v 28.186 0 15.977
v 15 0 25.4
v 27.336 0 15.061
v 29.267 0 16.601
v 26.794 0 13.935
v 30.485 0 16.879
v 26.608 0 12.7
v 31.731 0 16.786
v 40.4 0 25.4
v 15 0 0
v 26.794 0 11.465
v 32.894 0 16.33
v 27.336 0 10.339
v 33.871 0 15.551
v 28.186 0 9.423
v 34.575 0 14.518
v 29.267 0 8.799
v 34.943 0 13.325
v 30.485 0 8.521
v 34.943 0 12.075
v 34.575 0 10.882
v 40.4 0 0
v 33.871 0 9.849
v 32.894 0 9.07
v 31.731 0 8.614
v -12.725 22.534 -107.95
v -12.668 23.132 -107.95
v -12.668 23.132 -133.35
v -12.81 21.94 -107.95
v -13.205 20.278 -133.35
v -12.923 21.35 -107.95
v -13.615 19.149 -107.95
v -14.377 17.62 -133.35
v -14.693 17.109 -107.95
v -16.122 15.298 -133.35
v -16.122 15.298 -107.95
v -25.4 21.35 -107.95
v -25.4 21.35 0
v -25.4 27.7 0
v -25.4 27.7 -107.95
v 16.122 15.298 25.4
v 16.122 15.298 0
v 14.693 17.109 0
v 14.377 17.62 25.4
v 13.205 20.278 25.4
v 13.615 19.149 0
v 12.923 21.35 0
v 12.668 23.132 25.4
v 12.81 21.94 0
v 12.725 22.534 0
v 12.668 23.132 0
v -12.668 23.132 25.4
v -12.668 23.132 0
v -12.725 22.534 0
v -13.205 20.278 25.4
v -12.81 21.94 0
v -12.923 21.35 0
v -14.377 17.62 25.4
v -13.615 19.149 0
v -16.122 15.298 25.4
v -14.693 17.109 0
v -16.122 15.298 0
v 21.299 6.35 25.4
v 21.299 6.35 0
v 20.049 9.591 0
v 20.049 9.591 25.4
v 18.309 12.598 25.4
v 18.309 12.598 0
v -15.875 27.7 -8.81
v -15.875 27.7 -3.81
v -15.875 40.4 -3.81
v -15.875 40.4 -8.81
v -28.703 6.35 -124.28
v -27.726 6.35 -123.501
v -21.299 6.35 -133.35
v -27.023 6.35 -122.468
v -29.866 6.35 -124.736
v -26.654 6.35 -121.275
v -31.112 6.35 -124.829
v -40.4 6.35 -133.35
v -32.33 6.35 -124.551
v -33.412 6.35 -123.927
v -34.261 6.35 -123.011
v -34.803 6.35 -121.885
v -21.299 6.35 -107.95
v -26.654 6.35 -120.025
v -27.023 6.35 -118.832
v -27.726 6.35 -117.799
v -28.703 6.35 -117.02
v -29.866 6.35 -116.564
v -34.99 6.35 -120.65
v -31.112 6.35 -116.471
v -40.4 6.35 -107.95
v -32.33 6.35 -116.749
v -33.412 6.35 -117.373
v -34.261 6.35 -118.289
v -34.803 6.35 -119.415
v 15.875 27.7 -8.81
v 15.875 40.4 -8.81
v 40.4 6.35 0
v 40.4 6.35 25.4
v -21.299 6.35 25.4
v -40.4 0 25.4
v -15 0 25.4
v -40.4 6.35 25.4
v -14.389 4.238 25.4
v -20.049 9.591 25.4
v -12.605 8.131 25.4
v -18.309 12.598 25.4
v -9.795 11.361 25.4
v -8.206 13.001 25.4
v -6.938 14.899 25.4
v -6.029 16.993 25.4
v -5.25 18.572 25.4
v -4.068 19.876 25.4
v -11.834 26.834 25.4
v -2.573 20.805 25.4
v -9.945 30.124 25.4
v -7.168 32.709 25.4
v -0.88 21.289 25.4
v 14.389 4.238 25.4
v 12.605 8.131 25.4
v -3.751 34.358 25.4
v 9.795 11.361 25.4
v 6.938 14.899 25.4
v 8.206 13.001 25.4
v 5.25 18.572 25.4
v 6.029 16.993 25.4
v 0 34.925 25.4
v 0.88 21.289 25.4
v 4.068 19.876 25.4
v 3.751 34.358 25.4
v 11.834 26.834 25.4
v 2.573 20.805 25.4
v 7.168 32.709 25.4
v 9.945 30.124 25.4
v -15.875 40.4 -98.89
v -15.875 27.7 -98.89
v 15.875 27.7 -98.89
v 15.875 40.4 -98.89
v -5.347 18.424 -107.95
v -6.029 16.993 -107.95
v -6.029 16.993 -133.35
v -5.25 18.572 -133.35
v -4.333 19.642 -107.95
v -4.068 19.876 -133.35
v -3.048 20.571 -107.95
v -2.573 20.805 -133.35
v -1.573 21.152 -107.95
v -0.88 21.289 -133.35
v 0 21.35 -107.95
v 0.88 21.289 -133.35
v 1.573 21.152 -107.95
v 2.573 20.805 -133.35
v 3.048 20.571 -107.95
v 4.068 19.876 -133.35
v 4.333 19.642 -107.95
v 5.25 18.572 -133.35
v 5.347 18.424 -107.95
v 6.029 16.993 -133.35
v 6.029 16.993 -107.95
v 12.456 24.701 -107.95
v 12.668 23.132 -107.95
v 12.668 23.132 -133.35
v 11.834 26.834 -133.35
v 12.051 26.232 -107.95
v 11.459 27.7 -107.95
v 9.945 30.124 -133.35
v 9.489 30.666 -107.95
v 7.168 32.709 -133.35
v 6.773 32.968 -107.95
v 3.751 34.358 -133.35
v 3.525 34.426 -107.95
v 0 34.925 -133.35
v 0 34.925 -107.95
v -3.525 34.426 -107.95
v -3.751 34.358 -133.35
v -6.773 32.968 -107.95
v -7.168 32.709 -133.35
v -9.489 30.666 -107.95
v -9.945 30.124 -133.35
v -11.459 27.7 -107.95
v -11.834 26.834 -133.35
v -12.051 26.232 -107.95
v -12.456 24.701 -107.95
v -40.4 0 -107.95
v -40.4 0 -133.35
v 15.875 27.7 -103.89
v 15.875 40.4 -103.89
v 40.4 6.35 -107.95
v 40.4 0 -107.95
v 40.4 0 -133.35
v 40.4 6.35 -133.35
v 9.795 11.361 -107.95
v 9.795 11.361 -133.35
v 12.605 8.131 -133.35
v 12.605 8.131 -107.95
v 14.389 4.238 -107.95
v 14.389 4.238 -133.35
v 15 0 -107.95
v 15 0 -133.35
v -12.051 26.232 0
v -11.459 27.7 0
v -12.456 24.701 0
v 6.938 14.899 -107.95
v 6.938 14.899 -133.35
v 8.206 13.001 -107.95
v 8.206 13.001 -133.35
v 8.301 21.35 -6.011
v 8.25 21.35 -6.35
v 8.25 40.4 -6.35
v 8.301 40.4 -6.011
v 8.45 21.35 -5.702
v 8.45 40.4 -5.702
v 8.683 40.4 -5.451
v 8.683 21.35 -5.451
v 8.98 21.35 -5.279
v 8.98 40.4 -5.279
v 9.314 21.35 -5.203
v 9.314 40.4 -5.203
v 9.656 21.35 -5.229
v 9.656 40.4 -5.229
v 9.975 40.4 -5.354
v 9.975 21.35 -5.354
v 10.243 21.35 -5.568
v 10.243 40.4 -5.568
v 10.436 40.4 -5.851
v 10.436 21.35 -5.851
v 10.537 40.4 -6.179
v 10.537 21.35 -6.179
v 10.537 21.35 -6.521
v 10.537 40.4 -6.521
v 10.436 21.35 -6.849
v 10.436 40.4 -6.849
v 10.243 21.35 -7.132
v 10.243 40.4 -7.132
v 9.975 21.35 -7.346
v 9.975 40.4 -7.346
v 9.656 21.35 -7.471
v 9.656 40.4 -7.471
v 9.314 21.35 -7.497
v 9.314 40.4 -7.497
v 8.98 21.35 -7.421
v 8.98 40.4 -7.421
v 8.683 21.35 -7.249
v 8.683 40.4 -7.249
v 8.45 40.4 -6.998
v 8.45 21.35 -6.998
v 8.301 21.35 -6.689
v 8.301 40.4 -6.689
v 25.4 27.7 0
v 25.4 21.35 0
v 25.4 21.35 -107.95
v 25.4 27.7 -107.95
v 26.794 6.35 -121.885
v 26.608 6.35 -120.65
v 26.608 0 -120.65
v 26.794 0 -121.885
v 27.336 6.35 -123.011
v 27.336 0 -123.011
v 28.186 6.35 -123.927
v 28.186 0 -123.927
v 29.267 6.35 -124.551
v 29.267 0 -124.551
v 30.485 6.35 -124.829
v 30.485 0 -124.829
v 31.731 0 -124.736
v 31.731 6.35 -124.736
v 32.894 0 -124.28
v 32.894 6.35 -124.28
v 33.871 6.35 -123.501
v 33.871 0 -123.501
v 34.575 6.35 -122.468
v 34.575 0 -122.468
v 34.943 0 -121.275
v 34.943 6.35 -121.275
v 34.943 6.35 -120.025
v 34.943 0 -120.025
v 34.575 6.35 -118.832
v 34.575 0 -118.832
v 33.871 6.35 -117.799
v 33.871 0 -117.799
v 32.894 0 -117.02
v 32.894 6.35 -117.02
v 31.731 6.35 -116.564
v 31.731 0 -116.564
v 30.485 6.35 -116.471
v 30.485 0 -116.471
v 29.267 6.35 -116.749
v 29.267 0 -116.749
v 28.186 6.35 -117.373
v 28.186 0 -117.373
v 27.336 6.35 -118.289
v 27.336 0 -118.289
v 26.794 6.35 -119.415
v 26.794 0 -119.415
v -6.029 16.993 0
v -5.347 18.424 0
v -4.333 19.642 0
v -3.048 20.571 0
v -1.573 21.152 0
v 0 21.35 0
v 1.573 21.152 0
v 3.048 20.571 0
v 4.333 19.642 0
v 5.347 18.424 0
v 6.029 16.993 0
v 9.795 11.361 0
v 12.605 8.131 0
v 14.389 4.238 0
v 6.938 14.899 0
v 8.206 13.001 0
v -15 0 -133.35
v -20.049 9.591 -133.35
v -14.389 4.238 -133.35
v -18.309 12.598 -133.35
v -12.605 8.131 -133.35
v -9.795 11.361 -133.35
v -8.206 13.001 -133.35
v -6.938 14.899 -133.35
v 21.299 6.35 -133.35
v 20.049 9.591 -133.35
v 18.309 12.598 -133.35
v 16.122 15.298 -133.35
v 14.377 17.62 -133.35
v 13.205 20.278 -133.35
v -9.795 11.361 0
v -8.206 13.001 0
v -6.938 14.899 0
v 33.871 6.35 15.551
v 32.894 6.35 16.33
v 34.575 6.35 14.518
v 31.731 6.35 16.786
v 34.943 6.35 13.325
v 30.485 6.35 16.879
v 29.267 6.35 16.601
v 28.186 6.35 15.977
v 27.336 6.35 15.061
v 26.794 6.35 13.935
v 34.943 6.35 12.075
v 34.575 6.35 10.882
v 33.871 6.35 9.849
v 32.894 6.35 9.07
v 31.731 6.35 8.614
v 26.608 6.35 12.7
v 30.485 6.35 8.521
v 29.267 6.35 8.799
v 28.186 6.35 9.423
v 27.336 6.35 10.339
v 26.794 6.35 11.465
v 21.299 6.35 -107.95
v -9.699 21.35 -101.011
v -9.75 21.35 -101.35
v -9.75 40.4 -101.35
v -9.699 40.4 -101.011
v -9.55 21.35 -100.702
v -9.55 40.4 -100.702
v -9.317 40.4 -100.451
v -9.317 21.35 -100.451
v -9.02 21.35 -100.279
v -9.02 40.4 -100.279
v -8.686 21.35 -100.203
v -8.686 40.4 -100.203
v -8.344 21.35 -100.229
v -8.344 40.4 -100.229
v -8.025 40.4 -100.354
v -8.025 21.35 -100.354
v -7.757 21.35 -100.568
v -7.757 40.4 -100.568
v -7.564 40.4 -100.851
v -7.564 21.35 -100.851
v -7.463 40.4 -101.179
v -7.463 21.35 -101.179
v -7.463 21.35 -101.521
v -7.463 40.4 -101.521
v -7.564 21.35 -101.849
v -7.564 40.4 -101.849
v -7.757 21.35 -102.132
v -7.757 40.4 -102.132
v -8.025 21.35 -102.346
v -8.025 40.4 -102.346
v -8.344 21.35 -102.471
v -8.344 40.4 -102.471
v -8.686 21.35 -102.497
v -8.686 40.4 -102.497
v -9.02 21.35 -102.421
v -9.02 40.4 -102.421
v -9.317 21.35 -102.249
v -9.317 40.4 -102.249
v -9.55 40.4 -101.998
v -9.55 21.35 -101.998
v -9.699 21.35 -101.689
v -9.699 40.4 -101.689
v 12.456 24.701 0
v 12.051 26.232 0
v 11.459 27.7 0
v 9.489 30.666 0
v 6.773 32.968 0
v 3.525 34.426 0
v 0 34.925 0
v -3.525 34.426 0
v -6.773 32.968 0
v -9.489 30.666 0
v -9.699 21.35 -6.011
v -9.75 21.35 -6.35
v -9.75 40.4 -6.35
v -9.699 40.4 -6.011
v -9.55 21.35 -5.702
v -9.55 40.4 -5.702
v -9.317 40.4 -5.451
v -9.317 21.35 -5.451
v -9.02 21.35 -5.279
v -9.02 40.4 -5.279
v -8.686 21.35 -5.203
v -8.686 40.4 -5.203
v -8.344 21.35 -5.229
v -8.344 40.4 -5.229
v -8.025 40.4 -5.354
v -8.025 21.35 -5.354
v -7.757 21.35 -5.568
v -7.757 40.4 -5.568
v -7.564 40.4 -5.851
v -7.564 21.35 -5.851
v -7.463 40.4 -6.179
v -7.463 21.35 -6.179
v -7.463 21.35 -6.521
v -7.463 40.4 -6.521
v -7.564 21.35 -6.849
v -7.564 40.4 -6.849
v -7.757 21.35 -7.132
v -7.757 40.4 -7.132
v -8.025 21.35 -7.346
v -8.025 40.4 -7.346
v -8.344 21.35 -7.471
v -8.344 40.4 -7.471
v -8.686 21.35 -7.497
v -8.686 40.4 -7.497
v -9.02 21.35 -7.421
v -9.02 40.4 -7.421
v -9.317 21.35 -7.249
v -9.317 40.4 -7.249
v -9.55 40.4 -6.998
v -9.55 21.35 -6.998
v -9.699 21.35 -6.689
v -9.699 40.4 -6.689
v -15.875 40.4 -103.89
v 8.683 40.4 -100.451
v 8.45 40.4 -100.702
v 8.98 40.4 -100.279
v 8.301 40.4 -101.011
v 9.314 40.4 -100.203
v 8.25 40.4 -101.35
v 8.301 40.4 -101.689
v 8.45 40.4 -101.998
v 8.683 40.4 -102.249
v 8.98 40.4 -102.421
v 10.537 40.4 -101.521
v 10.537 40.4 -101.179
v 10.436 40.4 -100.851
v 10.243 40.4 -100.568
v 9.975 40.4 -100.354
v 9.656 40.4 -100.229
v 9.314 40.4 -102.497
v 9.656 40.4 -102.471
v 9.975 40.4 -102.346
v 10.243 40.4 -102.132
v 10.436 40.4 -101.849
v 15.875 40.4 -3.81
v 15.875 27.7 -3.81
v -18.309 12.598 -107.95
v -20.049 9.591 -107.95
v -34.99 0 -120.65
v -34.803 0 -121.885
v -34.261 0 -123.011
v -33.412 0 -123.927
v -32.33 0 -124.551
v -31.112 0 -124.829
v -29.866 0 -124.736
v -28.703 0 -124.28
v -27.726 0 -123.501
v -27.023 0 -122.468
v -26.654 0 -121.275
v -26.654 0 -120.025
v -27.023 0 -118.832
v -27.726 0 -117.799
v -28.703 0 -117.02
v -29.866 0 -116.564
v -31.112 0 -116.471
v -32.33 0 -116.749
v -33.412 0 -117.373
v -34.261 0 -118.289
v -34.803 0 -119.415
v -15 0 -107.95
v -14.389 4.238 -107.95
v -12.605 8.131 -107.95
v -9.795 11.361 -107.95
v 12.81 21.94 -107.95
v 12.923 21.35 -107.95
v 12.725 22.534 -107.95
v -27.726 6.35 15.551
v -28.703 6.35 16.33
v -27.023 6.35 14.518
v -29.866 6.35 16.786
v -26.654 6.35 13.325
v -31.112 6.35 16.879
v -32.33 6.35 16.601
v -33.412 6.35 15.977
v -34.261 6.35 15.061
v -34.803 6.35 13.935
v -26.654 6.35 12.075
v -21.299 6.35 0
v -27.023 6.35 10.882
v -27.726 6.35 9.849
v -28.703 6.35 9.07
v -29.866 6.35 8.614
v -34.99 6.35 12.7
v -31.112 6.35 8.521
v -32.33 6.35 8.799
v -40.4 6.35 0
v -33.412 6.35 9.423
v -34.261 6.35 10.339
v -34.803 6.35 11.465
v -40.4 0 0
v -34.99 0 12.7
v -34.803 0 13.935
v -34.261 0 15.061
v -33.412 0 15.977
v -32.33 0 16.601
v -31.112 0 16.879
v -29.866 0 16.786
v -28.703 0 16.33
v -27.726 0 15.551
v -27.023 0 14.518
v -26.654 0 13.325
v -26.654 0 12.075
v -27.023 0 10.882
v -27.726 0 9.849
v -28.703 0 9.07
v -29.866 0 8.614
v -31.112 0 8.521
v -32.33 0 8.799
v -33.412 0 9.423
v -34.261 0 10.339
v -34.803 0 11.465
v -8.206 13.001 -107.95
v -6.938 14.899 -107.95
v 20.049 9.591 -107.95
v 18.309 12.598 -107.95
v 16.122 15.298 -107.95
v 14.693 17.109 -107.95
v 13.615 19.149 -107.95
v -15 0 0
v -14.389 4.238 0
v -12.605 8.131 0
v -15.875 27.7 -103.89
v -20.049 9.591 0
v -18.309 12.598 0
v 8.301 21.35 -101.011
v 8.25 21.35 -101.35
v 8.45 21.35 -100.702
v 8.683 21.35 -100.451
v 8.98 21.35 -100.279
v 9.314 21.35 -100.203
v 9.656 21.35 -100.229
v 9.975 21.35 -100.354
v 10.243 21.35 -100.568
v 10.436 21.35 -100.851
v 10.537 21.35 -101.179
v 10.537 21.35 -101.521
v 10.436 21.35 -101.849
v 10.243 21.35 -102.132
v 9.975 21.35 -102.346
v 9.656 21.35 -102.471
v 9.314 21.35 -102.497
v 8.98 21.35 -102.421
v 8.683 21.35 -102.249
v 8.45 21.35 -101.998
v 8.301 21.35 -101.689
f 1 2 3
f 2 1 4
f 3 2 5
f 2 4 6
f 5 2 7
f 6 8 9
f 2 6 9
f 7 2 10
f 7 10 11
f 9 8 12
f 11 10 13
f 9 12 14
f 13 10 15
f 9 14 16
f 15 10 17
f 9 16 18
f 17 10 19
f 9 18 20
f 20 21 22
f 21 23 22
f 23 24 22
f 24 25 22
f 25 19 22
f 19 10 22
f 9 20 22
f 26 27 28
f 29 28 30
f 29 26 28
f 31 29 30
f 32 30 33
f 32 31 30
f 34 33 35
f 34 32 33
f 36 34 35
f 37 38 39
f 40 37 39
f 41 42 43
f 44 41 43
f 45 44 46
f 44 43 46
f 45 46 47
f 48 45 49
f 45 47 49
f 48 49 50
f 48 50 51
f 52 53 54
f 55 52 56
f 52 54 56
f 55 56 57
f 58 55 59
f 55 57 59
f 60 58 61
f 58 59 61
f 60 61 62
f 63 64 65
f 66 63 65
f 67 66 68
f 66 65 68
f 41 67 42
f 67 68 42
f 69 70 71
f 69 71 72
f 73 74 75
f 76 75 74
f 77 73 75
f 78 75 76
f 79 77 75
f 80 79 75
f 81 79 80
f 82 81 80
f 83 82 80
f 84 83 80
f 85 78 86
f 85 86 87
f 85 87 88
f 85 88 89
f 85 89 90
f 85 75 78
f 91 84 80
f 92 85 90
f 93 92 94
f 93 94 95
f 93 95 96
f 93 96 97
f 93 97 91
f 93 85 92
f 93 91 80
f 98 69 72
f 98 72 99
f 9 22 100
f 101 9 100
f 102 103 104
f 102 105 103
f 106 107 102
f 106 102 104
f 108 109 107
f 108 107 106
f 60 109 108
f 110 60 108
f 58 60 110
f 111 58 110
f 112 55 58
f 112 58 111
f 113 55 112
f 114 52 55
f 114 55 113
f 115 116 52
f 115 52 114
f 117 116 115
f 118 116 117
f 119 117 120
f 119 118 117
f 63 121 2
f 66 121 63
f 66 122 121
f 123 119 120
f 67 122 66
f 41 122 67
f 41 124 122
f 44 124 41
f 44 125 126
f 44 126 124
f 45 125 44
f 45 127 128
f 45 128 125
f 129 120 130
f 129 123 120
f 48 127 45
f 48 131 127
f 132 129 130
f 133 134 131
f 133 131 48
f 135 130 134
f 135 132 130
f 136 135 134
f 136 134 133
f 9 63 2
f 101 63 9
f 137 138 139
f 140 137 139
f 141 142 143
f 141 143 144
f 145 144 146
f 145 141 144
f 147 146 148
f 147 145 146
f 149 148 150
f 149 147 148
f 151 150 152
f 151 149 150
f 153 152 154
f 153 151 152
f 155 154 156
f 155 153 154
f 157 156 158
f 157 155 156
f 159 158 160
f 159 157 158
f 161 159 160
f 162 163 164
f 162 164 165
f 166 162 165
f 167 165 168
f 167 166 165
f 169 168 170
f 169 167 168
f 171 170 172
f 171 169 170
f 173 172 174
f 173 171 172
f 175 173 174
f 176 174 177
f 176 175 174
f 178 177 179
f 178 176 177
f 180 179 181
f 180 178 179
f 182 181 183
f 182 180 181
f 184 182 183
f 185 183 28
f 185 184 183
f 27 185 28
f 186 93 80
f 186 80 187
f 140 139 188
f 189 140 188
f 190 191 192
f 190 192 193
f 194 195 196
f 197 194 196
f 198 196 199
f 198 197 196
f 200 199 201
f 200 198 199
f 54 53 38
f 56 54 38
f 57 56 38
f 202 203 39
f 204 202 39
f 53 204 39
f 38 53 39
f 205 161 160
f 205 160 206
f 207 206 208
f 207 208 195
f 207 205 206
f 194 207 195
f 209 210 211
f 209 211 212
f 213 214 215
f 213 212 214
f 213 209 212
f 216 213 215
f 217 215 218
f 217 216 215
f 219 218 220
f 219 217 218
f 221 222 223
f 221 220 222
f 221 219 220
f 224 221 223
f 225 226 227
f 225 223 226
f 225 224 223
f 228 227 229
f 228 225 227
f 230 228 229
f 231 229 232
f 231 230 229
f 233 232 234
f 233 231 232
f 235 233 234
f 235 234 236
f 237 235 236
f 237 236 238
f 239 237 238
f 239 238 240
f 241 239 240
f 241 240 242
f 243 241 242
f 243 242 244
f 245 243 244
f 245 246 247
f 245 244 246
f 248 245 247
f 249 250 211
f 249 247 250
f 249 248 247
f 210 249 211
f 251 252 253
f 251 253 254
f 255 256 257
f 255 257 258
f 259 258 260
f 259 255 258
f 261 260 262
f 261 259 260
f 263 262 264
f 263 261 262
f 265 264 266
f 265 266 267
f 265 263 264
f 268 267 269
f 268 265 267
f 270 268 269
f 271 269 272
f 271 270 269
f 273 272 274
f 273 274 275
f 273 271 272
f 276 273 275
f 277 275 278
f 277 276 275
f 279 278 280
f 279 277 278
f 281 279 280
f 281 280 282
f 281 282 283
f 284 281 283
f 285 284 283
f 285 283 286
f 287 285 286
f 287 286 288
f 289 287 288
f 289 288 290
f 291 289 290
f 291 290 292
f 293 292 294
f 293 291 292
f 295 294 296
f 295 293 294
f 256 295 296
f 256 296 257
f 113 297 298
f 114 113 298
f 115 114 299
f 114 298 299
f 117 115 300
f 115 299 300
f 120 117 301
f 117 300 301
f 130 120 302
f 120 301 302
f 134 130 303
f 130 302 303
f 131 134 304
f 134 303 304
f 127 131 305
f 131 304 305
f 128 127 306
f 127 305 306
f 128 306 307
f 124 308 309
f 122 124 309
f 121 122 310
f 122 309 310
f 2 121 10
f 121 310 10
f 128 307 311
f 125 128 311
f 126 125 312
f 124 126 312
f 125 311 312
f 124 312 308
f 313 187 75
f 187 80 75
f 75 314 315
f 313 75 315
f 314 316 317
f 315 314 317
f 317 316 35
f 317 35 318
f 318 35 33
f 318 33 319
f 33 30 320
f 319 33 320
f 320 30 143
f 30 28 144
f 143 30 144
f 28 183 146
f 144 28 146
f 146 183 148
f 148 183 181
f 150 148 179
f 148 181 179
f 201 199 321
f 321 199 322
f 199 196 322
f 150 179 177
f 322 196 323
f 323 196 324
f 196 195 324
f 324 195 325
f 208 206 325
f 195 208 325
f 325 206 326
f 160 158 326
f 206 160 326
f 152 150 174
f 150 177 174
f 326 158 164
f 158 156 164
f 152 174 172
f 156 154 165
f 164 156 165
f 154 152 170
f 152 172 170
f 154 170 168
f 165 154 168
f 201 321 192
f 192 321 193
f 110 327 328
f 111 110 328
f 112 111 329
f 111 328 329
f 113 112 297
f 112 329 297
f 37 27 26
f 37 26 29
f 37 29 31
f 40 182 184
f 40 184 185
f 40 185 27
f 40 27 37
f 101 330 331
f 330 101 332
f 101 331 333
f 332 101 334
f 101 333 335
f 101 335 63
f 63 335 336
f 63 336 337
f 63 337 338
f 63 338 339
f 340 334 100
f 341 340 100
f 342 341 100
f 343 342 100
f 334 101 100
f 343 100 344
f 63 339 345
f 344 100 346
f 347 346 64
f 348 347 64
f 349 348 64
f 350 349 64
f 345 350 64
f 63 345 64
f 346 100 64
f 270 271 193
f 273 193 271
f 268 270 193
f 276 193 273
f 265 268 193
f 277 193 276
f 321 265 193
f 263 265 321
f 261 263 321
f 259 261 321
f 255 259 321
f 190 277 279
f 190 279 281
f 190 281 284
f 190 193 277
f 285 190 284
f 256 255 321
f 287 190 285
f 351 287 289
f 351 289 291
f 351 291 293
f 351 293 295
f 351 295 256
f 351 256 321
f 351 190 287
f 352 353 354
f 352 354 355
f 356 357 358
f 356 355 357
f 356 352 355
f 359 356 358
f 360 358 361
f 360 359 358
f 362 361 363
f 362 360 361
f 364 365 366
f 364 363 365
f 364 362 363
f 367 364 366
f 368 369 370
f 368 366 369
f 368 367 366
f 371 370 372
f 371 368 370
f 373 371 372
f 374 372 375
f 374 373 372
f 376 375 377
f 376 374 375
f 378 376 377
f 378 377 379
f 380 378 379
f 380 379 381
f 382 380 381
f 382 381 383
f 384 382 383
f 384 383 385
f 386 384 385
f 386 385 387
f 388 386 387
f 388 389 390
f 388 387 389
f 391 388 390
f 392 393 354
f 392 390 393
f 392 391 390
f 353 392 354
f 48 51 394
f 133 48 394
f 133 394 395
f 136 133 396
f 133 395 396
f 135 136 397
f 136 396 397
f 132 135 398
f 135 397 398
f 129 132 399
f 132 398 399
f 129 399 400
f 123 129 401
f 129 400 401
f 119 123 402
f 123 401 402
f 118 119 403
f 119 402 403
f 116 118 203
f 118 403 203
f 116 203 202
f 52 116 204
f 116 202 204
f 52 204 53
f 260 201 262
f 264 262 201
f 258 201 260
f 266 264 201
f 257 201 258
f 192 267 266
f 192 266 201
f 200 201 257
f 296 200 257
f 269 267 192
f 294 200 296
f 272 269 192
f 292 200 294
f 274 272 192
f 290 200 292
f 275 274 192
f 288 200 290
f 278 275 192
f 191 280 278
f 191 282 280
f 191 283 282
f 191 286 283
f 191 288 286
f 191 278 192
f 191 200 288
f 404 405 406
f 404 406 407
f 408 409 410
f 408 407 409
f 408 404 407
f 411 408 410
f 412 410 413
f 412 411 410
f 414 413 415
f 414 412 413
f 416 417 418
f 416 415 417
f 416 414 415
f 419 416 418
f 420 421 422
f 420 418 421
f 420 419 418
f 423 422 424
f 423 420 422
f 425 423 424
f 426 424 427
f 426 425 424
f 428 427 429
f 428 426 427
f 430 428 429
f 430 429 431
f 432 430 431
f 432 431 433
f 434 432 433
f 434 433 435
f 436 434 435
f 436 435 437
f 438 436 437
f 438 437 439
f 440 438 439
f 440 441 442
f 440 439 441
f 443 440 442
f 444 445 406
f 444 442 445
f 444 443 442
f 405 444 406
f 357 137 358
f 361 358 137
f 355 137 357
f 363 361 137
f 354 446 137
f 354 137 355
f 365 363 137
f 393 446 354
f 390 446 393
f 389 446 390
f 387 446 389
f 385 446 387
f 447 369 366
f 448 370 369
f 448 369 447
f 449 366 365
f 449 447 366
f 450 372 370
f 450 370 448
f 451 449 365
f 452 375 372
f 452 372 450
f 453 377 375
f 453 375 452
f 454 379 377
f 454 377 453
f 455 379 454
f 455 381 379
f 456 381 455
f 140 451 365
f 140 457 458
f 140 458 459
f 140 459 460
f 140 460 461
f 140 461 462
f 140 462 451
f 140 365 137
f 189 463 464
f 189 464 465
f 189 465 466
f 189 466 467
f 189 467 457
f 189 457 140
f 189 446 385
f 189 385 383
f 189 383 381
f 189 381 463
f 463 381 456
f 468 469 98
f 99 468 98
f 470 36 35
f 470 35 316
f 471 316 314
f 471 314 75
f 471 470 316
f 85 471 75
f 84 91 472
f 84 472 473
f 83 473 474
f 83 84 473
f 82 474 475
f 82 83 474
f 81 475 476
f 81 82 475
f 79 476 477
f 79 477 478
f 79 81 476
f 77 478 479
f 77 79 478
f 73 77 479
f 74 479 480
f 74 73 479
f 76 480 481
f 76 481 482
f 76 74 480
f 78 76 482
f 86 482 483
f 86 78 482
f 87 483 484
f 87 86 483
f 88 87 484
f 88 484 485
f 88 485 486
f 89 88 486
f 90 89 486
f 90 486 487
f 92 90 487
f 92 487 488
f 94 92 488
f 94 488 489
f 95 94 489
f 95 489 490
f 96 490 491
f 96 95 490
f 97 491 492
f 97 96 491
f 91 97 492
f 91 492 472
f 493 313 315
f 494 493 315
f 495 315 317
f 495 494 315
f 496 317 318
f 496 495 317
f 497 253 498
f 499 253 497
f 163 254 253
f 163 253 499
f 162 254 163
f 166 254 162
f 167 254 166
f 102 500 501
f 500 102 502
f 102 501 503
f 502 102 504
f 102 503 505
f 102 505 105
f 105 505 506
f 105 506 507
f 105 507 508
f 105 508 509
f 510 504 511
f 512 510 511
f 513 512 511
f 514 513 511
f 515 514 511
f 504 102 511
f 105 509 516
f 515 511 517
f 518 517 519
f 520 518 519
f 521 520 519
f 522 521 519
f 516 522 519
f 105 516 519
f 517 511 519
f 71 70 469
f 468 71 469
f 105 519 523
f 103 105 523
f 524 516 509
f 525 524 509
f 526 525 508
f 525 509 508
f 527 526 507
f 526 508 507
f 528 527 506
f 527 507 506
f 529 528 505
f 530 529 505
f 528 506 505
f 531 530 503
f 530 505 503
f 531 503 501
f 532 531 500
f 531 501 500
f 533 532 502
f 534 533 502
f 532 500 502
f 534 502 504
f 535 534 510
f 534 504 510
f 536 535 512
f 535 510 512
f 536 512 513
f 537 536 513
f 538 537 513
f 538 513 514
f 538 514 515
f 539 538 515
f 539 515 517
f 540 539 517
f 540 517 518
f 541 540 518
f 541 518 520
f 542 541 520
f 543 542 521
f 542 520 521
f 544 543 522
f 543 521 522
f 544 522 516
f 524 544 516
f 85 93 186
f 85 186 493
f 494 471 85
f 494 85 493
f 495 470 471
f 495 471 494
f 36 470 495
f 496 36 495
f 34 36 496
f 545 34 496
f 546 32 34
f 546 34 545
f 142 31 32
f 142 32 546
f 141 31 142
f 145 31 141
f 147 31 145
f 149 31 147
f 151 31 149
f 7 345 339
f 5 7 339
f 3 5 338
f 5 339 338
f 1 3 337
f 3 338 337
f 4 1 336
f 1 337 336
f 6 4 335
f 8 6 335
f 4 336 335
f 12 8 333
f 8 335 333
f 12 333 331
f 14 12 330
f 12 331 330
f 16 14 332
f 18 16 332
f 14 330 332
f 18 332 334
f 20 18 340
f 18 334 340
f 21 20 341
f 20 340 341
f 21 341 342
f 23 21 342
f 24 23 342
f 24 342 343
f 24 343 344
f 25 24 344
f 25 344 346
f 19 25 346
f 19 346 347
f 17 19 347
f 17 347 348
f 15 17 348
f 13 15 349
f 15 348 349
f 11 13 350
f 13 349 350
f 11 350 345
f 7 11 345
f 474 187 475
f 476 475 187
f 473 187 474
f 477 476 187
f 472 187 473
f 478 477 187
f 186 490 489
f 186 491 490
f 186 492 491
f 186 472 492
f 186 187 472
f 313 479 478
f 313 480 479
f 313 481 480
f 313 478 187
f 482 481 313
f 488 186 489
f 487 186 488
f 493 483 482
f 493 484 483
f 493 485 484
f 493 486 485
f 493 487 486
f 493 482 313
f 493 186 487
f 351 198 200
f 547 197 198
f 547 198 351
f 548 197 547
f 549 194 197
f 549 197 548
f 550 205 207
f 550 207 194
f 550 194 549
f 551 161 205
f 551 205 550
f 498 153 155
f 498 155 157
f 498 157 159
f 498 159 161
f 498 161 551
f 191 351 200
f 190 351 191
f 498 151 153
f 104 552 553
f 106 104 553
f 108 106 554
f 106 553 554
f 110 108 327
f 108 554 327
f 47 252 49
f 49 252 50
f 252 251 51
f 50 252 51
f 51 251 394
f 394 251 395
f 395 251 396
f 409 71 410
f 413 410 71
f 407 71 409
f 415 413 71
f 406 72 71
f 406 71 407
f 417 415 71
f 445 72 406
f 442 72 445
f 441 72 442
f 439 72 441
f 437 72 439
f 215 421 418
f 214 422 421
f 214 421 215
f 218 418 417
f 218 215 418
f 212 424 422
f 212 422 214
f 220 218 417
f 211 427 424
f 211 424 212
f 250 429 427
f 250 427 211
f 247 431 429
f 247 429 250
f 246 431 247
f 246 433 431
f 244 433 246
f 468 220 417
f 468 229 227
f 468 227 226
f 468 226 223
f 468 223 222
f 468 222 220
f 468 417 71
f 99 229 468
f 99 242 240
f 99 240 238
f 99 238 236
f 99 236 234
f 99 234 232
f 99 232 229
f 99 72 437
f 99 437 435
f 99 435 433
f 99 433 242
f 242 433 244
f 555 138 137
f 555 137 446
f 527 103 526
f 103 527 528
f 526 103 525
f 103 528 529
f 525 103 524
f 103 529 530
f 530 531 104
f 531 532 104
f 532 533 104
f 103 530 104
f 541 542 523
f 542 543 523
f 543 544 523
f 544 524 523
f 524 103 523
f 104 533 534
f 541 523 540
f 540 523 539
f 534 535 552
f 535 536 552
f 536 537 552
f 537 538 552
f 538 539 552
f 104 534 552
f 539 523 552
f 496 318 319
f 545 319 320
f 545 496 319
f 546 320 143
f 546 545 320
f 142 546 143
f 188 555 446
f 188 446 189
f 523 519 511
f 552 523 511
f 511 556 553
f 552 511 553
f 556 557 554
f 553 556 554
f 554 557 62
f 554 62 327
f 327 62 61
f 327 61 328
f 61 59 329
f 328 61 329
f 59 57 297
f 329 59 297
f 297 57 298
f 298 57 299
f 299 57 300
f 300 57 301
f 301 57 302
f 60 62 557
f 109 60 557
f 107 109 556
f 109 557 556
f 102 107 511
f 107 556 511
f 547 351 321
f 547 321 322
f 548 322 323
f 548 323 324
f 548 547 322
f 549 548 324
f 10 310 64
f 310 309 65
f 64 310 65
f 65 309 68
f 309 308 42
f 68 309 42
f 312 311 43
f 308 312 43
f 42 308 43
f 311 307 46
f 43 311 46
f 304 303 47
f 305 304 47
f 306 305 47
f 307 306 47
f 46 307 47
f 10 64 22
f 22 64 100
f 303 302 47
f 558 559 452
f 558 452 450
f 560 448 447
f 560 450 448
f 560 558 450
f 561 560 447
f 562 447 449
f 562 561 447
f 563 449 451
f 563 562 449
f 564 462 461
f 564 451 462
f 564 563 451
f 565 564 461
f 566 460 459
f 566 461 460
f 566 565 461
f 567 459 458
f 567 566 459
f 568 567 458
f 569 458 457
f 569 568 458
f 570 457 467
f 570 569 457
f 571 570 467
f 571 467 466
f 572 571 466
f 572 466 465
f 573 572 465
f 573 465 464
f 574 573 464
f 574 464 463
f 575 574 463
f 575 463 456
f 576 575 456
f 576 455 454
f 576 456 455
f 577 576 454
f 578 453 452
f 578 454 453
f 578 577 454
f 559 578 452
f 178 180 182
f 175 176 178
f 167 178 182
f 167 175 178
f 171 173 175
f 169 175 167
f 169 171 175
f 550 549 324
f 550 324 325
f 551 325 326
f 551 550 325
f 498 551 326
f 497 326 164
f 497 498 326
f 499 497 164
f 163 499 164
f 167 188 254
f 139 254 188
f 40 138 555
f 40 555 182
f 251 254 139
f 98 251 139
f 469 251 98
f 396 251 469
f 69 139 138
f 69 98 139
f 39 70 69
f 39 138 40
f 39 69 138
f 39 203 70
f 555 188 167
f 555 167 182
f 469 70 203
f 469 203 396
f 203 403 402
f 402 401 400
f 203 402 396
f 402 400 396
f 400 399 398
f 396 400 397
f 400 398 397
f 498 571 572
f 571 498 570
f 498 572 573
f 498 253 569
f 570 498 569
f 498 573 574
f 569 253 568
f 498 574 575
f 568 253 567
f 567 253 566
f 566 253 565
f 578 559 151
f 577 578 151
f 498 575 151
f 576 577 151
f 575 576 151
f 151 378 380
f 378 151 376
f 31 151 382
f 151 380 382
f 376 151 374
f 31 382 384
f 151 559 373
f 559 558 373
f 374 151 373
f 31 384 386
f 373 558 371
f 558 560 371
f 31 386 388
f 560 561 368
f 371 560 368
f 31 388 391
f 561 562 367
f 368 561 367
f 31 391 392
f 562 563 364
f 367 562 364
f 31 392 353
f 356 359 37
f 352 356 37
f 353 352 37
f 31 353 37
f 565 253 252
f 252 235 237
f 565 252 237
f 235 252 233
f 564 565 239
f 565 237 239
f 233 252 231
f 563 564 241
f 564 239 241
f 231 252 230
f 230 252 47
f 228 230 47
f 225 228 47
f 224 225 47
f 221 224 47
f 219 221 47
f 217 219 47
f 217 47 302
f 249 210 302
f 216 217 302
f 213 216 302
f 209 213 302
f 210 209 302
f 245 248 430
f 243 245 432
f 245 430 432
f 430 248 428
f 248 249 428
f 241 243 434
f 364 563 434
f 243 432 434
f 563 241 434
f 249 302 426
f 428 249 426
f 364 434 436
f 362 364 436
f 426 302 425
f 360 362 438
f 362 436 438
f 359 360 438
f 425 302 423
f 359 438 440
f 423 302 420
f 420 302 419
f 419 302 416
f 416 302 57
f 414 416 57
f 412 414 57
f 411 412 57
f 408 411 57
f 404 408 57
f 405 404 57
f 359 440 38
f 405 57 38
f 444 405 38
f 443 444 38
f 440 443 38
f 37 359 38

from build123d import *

# Parameters (mm, degrees)
BOSS_EXTRUDE1_DEPTH     = 25.4
SKETCH2_R               = 4.191
CUT_EXTRUDE1_DEPTH      = 6.35
SKETCH3_W               = 50.8
SKETCH3_H               = 6.35
BOSS_EXTRUDE2_DEPTH     = 107.95
SKETCH5_W               = 31.75
SKETCH5_H               = 5
BOSS_EXTRUDE3_DEPTH     = 12.7
CUT_EXTRUDE2_DEPTH      = 143.062213484
CUT_EXTRUDE2_DEPTH_BACK = 143.062213484
SKETCH4_R               = 1.15


with BuildPart() as part:
    # Sketch1 → Boss-Extrude1 (new body)
    with BuildSketch(Plane.XY):
        with BuildLine():
            Line((-40.4, 0), (-15, 0))
            ThreePointArc((-15, 0), (-13.636673939, 6.248289676), (-9.794516817, 11.360785199))
            ThreePointArc((-9.794516817, 11.360785199), (-7.529268877, 13.921260066), (-6.02906924, 16.993194444))
            ThreePointArc((-6.02906924, 16.993194444), (0, 21.35), (6.02906924, 16.993194444))
            ThreePointArc((6.02906924, 16.993194444), (7.529268877, 13.921260066), (9.794516817, 11.360785199))
            ThreePointArc((9.794516817, 11.360785199), (13.636673939, 6.248289676), (15, 0))
            Line((15, 0), (40.4, 0))
            Line((40.4, 0), (40.4, 6.35))
            Line((40.4, 6.35), (21.298547486, 6.35))
            ThreePointArc((21.298547486, 6.35), (19.237888282, 11.128983757), (16.122349869, 15.297727273))
            ThreePointArc((16.122349869, 15.297727273), (13.714805021, 18.915005141), (12.667560611, 23.132142857))
            ThreePointArc((12.667560611, 23.132142857), (0, 34.925), (-12.667560611, 23.132142857))
            ThreePointArc((-12.667560611, 23.132142857), (-13.714805021, 18.915005141), (-16.122349869, 15.297727273))
            ThreePointArc((-16.122349869, 15.297727273), (-19.237888282, 11.128983757), (-21.298547486, 6.35))
            Line((-21.298547486, 6.35), (-40.4, 6.35))
            Line((-40.4, 6.35), (-40.4, 0))
        make_face()
    boss_extrude1 = extrude(amount=BOSS_EXTRUDE1_DEPTH)

    # Sketch2 → Cut-Extrude1 (cut)
    with BuildSketch(Plane(origin=(0, 6.35, 0), x_dir=(1, 0, 0), z_dir=(0, 1, 0))):
        with Locations(Location((-30.798547486, -12.7, 0), (0, 0, 180))):
            Circle(SKETCH2_R)
        with Locations(Location((30.798553886, -12.7, 0), (0, 0, 180))):
            Circle(SKETCH2_R)
    cut_extrude1 = extrude(amount=-CUT_EXTRUDE1_DEPTH, mode=Mode.SUBTRACT)

    # Sketch3 → Boss-Extrude2 (add)
    with BuildSketch(Plane(origin=(0, 0, 0), x_dir=(-1, 0, 0), z_dir=(0, 0, -1))):
        with Locations((0, 24.525)):
            Rectangle(SKETCH3_W, SKETCH3_H)
    extrude(amount=BOSS_EXTRUDE2_DEPTH)

    # Mirror1: Boss-Extrude1, Cut-Extrude1 across plane
    add(boss_extrude1.mirror(Plane(origin=(0, 0, -53.975), x_dir=(1, 0, 0), z_dir=(0, 0, -1))))
    add(cut_extrude1.mirror(Plane(origin=(0, 0, -53.975), x_dir=(1, 0, 0), z_dir=(0, 0, -1))), mode=Mode.SUBTRACT)

    # Sketch5 → Boss-Extrude3 (add)
    with BuildSketch(Plane(origin=(0, 27.7, 0), x_dir=(1, 0, 0), z_dir=(0, 1, 0))):
        with Locations((0, 6.31)):
            Rectangle(SKETCH5_W, SKETCH5_H)
        with Locations((0, 101.3899878)):
            Rectangle(SKETCH5_W, SKETCH5_H)
    extrude(amount=BOSS_EXTRUDE3_DEPTH)

    # Sketch4 → Cut-Extrude2 (cut, two sides: drawn at the far end of the back side and taken through both)
    with BuildSketch(Plane(origin=(0, 27.7, 0), x_dir=(1, 0, 0), z_dir=(0, 1, 0)).offset(-CUT_EXTRUDE2_DEPTH_BACK)):
        with Locations(Location((9.4, 101.349999992, 0), (0, 0, 180))):
            Circle(SKETCH4_R)
        with Locations(Location((-8.6, 101.35, 0), (0, 0, 180))):
            Circle(SKETCH4_R)
        with Locations(Location((9.4, 6.35, 0), (0, 0, 180))):
            Circle(SKETCH4_R)
        with Locations(Location((-8.6, 6.35, 0), (0, 0, 180))):
            Circle(SKETCH4_R)
    extrude(amount=CUT_EXTRUDE2_DEPTH + CUT_EXTRUDE2_DEPTH_BACK, mode=Mode.SUBTRACT)


solid = part.part
